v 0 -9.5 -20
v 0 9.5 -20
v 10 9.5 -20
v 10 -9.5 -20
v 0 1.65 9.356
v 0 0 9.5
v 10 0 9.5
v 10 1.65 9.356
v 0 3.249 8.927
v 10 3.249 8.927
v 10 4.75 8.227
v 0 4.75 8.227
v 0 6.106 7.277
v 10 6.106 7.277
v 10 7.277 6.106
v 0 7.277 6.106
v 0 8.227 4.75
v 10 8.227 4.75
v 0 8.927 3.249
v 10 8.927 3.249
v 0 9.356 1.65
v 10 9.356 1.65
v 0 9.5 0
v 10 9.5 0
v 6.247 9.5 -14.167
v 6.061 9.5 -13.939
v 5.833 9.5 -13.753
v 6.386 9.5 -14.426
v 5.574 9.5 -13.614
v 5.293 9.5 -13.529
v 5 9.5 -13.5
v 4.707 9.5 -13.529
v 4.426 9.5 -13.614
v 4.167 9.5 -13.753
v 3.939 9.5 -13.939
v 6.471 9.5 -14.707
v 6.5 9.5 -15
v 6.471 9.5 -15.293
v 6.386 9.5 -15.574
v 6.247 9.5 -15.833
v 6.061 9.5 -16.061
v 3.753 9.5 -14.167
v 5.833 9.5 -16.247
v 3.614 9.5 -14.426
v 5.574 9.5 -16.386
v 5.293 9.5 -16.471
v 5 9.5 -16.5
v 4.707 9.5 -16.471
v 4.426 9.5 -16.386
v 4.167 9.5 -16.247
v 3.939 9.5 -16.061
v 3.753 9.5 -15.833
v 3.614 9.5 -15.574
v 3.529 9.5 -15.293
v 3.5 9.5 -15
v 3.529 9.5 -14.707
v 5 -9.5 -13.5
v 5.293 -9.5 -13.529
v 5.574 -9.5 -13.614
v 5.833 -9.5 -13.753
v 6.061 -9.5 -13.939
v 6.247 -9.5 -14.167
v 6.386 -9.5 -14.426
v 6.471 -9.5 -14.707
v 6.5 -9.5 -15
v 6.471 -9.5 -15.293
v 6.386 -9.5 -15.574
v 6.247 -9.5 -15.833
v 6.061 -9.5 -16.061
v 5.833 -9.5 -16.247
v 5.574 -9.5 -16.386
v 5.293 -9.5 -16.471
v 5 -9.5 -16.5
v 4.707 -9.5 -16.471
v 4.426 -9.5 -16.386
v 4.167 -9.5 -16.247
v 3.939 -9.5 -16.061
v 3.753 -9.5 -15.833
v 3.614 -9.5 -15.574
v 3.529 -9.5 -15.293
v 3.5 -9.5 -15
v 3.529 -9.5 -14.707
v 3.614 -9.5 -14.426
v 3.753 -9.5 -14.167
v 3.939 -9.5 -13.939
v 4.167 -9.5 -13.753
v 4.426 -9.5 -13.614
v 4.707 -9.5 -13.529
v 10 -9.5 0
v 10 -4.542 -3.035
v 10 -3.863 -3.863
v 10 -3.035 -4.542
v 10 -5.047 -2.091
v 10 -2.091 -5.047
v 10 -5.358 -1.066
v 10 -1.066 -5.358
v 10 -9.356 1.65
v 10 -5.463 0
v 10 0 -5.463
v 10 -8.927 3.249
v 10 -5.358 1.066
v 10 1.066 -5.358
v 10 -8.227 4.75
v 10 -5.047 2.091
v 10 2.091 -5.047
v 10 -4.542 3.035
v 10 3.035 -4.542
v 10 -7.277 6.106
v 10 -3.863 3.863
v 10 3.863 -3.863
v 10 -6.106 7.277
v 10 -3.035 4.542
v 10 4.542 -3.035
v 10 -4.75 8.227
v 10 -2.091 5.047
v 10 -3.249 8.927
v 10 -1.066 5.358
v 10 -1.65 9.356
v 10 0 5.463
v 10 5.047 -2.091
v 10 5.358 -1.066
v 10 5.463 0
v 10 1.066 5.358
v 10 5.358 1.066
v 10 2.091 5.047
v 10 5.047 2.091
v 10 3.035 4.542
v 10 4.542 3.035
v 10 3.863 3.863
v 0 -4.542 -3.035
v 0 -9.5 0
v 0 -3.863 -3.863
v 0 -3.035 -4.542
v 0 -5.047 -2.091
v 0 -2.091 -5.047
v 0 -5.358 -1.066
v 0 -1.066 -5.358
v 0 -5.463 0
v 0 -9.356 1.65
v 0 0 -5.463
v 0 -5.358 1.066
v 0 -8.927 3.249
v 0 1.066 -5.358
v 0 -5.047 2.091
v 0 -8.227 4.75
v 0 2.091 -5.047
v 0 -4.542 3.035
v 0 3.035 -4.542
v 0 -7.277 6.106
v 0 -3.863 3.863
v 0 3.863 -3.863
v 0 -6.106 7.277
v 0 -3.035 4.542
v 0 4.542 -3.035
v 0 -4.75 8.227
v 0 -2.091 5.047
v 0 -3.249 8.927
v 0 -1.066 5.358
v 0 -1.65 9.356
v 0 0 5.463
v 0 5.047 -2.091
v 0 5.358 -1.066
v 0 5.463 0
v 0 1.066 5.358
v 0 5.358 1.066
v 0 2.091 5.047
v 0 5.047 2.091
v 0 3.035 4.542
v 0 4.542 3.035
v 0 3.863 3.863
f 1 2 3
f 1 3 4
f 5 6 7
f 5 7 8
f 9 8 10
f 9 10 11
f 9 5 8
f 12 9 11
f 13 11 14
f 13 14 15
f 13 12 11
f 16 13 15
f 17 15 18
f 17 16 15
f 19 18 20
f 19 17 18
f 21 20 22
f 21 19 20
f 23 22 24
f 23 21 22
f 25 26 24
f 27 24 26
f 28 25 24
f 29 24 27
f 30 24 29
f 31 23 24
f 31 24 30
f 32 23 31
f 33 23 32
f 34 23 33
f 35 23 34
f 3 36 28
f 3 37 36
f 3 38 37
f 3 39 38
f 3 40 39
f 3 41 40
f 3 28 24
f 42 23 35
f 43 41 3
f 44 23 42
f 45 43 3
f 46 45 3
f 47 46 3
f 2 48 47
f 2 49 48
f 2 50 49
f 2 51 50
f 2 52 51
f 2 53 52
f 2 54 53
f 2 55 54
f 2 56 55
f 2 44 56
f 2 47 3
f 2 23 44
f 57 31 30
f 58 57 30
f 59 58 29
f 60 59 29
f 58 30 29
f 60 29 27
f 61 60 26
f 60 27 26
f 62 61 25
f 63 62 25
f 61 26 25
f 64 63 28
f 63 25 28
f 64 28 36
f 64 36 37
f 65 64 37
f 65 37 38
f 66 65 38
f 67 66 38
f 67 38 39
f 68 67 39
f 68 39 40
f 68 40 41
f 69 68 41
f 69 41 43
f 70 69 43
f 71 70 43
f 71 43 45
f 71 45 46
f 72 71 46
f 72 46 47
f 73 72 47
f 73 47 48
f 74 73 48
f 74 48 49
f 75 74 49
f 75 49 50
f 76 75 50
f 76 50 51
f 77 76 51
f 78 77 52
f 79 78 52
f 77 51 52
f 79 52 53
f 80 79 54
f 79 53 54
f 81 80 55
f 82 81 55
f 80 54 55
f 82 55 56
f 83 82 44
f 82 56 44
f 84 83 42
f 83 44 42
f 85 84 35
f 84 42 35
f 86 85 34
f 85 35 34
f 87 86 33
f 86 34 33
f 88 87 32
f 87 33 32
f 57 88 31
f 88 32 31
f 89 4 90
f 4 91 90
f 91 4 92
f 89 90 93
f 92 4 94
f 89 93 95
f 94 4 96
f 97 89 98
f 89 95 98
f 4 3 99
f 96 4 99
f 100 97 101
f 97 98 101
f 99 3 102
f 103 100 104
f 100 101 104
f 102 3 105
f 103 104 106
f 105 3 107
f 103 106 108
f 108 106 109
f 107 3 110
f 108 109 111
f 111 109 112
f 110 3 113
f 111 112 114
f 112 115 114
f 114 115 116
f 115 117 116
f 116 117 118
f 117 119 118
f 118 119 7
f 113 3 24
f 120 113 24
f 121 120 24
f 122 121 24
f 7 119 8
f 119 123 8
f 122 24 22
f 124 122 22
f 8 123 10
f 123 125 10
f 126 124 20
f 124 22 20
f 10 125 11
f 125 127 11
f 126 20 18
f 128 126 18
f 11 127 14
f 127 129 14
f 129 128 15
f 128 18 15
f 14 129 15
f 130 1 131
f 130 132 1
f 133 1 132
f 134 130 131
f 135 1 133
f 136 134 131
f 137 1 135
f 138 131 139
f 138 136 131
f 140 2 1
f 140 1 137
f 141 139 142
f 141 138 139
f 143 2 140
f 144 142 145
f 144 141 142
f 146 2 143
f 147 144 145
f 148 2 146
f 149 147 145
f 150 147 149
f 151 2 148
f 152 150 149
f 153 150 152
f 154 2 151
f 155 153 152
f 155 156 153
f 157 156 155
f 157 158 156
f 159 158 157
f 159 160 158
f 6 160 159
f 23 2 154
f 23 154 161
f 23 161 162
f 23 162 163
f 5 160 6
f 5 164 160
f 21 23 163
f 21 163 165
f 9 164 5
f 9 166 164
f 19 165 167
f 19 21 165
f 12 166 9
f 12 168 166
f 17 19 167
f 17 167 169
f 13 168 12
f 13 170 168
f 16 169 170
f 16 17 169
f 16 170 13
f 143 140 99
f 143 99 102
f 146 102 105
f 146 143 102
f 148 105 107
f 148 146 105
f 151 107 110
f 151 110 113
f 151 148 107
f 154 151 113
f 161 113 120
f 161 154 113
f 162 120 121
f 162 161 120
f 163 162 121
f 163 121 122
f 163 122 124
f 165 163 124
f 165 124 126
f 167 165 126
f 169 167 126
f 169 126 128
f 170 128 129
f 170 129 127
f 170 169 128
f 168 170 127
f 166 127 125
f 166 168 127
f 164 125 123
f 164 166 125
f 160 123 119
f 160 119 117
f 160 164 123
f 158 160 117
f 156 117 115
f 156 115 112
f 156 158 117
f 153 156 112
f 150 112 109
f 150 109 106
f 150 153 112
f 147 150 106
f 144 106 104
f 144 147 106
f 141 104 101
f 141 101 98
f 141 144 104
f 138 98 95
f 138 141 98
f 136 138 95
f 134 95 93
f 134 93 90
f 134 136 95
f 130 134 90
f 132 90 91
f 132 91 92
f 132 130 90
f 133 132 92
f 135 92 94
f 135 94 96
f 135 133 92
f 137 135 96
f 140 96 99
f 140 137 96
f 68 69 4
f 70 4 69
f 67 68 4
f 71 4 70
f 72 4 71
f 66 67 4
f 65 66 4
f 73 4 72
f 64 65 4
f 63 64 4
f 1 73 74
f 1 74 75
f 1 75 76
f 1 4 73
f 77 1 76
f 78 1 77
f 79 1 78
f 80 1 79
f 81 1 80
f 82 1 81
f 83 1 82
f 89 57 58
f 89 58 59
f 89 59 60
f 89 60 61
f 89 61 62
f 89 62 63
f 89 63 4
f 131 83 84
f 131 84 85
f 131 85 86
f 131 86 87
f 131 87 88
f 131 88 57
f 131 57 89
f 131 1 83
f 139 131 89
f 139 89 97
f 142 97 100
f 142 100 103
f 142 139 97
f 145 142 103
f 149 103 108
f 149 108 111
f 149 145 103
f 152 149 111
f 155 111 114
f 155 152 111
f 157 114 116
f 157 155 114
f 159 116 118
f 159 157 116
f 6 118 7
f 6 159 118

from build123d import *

# Parameters (mm, degrees)
SKETCH_1_R          = 5.462836395
EXTRUDE_1_DEPTH     = 10
SKETCH_2_R          = 1.5
CUT_EXTRUDE_1_DEPTH = 30.342801502


with BuildPart() as part:
    # 草图1 → 凸台-拉伸1 (new body)
    with BuildSketch(Plane(origin=(0, 0, 0), x_dir=(0, 0, -1), z_dir=(1, 0, 0))):
        with BuildLine():
            Line((0, 9.5), (20, 9.5))
            Line((20, 9.5), (20, -9.5))
            Line((20, -9.5), (0, -9.5))
            ThreePointArc((0, -9.5), (-6.717514421, -6.717514421), (-9.5, 0))
            ThreePointArc((-9.5, 0), (-6.717514421, 6.717514421), (0, 9.5))
        make_face()
        Circle(SKETCH_1_R, mode=Mode.SUBTRACT)
    extrude(amount=EXTRUDE_1_DEPTH)

    # 草图2 → 切除-拉伸1 (cut, through all)
    with BuildSketch(Plane(origin=(0, 9.5, 0), x_dir=(1, 0, 0), z_dir=(0, 1, 0))):
        with Locations(Location((5, 15, 0), (0, 0, 270))):
            Circle(SKETCH_2_R)
    extrude(amount=-CUT_EXTRUDE_1_DEPTH, mode=Mode.SUBTRACT)


solid = part.part
